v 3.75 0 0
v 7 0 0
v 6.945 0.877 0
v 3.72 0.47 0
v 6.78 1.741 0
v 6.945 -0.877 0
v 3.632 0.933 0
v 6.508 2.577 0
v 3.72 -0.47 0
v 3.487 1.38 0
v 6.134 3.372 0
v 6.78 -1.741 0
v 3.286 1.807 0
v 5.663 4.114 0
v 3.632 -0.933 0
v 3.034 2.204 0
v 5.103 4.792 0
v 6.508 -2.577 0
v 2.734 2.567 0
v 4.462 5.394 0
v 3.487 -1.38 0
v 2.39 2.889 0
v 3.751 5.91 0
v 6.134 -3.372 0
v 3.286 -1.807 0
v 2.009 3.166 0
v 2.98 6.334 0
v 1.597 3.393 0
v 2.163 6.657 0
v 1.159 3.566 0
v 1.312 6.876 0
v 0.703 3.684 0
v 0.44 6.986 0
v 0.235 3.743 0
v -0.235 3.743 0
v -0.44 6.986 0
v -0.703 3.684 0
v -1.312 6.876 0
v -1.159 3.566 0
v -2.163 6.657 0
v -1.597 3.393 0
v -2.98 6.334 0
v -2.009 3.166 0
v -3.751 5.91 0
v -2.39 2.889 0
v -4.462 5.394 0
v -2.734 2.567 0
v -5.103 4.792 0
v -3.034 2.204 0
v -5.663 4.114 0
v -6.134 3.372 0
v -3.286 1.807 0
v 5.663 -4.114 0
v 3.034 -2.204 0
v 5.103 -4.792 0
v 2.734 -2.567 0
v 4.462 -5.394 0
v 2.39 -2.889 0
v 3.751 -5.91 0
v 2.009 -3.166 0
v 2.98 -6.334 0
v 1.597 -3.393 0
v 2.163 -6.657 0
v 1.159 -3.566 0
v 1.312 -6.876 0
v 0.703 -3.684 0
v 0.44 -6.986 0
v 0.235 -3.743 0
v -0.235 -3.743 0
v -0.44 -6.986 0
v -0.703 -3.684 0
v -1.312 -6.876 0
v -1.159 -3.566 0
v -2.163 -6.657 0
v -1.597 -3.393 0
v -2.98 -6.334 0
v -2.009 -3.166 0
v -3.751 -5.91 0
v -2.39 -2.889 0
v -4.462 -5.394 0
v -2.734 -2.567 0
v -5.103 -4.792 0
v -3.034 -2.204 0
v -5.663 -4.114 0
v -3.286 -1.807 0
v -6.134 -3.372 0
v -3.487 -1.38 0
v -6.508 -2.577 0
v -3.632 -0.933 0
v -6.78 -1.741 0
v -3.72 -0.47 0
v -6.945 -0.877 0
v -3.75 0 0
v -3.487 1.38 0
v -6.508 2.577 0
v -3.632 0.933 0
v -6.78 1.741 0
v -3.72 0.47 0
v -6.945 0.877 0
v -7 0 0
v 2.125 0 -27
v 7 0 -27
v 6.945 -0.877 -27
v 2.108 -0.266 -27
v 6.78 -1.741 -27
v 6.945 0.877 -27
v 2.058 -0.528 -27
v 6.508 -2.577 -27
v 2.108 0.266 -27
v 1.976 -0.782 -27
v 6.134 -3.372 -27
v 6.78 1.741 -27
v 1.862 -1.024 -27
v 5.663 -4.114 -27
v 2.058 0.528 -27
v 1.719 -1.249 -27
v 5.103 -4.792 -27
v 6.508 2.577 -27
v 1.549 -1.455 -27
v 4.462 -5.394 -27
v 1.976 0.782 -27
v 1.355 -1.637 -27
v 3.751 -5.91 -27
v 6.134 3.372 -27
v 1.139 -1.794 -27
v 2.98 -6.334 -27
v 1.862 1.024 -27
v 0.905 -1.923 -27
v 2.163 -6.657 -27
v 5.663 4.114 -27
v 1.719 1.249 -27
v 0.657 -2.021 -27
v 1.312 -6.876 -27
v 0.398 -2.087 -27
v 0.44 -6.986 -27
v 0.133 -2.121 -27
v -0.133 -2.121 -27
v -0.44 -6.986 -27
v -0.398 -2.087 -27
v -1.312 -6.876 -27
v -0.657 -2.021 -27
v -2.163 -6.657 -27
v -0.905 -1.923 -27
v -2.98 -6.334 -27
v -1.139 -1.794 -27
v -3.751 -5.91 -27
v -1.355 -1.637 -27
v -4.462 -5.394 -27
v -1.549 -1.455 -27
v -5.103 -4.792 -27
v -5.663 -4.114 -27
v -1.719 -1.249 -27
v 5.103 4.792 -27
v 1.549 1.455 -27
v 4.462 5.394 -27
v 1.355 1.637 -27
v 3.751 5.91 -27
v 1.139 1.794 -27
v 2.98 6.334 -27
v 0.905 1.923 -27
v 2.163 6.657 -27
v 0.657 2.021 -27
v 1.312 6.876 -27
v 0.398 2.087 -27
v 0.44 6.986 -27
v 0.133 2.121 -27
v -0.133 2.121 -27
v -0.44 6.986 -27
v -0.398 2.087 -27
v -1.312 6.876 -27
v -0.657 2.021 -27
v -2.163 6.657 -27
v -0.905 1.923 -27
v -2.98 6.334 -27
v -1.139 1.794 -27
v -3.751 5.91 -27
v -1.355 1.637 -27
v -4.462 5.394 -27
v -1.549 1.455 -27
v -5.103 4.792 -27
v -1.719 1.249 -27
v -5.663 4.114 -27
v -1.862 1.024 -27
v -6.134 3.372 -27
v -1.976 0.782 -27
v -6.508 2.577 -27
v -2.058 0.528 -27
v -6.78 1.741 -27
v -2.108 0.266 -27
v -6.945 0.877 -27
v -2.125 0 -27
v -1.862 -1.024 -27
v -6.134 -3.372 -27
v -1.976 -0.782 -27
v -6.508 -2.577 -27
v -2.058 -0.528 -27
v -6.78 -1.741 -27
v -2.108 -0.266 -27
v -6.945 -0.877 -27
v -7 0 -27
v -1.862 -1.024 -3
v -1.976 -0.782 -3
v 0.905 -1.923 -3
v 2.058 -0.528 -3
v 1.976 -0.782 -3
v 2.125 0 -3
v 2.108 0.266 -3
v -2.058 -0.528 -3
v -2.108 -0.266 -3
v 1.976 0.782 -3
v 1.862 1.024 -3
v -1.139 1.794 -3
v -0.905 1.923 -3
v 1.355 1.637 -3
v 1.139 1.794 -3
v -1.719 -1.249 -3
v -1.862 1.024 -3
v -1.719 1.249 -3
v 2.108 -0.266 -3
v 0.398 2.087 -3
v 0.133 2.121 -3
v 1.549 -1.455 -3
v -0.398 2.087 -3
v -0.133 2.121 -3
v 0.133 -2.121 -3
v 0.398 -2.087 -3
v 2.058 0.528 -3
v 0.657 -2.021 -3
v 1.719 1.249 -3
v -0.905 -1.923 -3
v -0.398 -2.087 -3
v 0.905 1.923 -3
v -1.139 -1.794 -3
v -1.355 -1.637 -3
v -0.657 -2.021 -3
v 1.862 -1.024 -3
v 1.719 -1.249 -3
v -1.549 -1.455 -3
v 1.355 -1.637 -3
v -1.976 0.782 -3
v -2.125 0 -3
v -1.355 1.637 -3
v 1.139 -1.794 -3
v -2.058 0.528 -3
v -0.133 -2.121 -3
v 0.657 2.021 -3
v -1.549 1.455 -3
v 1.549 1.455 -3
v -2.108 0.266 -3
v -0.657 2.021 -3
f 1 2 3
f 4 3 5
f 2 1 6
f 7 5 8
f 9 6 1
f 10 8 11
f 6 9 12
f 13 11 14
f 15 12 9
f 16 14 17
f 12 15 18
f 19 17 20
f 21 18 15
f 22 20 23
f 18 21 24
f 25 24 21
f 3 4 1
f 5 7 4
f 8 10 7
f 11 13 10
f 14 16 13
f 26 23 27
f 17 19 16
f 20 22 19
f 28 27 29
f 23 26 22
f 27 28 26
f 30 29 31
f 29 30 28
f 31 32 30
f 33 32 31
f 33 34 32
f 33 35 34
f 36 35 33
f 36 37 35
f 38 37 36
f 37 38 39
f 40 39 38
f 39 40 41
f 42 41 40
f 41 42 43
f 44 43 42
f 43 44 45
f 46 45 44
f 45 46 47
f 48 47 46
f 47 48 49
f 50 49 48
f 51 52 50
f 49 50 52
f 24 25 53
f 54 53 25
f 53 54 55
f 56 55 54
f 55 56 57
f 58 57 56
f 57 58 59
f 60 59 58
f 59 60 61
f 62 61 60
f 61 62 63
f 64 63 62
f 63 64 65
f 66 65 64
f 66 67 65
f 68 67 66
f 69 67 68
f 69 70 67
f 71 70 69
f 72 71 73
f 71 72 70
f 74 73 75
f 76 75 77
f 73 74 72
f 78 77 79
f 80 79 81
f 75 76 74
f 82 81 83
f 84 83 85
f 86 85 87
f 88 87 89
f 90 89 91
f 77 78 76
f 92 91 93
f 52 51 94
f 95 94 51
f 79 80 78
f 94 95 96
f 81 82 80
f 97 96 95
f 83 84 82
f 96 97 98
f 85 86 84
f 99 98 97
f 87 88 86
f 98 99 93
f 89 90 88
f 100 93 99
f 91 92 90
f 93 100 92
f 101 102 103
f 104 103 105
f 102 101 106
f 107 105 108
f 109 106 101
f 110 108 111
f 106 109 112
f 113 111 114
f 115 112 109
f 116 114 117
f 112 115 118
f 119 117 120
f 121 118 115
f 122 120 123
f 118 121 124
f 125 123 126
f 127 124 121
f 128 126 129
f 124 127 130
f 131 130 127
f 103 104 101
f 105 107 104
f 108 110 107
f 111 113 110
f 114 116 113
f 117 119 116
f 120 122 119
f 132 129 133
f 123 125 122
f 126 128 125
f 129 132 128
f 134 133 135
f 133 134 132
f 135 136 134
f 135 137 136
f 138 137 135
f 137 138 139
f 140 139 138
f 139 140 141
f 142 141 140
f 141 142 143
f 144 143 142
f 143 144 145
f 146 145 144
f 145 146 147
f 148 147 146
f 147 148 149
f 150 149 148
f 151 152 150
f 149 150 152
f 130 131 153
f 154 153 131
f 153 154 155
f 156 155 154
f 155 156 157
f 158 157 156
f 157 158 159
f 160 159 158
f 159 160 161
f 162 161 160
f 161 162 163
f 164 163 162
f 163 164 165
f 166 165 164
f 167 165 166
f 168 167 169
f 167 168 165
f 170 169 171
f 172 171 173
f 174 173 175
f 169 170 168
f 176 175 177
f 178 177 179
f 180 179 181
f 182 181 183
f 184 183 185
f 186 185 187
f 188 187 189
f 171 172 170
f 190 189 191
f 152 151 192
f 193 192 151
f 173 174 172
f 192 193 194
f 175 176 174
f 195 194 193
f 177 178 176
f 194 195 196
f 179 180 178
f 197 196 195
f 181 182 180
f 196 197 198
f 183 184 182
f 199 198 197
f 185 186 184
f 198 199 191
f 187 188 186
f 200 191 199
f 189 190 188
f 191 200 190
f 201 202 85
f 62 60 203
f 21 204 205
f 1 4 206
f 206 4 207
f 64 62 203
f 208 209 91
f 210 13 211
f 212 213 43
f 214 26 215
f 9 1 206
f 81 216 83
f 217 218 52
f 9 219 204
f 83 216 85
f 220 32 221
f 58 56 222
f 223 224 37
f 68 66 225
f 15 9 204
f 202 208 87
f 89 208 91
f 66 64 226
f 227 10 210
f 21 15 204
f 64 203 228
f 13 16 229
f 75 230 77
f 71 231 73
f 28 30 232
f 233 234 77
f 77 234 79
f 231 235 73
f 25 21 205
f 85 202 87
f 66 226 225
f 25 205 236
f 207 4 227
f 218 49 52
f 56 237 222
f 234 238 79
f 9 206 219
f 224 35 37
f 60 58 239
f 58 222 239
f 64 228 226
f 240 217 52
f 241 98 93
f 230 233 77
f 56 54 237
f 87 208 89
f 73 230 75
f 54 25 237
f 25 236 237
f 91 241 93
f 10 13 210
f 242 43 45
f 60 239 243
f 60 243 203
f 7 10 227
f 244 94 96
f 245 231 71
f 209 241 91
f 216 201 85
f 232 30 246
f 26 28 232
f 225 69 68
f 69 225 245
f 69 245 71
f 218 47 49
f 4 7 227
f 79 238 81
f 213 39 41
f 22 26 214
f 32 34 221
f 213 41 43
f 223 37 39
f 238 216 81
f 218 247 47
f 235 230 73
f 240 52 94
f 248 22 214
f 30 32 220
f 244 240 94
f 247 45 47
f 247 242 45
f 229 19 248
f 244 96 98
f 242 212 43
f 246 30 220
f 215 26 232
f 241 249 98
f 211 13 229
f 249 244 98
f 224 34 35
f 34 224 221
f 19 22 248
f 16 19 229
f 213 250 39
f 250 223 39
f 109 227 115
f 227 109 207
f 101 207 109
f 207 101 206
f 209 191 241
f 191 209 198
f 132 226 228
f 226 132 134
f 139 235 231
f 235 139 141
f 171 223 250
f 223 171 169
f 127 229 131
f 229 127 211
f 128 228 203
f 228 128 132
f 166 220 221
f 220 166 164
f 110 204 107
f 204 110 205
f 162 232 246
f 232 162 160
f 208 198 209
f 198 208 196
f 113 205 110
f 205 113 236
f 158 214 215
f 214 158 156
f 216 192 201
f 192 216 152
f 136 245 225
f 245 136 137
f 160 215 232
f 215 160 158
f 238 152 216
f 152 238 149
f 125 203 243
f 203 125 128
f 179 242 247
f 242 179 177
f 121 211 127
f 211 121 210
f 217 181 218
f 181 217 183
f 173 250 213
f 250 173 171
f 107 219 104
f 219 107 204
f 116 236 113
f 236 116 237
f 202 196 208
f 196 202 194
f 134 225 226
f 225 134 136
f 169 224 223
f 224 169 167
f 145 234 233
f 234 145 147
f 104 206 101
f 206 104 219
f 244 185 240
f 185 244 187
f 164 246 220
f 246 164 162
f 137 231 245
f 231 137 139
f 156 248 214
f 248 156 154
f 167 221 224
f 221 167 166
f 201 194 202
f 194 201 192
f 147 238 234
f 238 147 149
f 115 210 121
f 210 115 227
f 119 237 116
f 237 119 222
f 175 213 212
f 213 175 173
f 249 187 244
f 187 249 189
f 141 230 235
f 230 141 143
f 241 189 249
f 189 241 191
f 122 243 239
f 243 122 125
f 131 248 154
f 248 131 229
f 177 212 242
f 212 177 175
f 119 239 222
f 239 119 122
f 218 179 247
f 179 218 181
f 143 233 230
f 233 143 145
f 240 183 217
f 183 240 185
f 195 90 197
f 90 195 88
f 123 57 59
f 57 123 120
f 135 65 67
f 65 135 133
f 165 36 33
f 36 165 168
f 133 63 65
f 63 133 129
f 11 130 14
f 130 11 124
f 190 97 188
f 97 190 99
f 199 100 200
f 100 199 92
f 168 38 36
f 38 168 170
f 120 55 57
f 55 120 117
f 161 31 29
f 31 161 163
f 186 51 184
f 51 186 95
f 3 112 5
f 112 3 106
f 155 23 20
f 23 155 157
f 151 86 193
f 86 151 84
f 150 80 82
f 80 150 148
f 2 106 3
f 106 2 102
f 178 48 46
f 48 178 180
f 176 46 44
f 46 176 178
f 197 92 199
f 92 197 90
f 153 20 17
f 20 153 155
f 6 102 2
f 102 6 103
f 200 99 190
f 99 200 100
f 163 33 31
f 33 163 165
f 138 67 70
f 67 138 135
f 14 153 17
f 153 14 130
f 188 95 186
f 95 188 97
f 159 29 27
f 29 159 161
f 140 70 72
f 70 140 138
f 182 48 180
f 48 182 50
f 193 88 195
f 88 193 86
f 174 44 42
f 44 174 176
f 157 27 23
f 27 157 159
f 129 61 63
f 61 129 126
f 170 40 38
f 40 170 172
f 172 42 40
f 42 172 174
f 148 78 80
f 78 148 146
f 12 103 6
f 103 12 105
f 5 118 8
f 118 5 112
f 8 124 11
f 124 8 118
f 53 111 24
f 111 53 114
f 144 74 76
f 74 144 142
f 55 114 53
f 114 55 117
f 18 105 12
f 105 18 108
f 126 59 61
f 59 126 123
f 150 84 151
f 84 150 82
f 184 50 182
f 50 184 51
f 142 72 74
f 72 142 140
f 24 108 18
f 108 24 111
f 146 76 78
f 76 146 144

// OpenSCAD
$fn = 50;


difference() {
	union() {
		translate(v = [0, 0, -27.0000000000]) {
			cylinder(h = 27, r = 7.0000000000);
		}
	}
	union() {
		translate(v = [0, 0, 0]) {
			rotate(a = [0, 0, 0]) {
				difference() {
					union() {
						#translate(v = [0, 0, -27.0000000000]) {
							cylinder(h = 27, r = 2.0000000000);
						}
						#translate(v = [0, 0, -3]) {
							cylinder(h = 3, r1 = 2.1250000000, r2 = 3.7500000000);
						}
						#translate(v = [0, 0, -27.0000000000]) {
							cylinder(h = 27, r = 2.1250000000);
						}
						#translate(v = [0, 0, -27.0000000000]) {
							cylinder(h = 27, r = 2.0000000000);
						}
					}
					union();
				}
			}
		}
	}
}
